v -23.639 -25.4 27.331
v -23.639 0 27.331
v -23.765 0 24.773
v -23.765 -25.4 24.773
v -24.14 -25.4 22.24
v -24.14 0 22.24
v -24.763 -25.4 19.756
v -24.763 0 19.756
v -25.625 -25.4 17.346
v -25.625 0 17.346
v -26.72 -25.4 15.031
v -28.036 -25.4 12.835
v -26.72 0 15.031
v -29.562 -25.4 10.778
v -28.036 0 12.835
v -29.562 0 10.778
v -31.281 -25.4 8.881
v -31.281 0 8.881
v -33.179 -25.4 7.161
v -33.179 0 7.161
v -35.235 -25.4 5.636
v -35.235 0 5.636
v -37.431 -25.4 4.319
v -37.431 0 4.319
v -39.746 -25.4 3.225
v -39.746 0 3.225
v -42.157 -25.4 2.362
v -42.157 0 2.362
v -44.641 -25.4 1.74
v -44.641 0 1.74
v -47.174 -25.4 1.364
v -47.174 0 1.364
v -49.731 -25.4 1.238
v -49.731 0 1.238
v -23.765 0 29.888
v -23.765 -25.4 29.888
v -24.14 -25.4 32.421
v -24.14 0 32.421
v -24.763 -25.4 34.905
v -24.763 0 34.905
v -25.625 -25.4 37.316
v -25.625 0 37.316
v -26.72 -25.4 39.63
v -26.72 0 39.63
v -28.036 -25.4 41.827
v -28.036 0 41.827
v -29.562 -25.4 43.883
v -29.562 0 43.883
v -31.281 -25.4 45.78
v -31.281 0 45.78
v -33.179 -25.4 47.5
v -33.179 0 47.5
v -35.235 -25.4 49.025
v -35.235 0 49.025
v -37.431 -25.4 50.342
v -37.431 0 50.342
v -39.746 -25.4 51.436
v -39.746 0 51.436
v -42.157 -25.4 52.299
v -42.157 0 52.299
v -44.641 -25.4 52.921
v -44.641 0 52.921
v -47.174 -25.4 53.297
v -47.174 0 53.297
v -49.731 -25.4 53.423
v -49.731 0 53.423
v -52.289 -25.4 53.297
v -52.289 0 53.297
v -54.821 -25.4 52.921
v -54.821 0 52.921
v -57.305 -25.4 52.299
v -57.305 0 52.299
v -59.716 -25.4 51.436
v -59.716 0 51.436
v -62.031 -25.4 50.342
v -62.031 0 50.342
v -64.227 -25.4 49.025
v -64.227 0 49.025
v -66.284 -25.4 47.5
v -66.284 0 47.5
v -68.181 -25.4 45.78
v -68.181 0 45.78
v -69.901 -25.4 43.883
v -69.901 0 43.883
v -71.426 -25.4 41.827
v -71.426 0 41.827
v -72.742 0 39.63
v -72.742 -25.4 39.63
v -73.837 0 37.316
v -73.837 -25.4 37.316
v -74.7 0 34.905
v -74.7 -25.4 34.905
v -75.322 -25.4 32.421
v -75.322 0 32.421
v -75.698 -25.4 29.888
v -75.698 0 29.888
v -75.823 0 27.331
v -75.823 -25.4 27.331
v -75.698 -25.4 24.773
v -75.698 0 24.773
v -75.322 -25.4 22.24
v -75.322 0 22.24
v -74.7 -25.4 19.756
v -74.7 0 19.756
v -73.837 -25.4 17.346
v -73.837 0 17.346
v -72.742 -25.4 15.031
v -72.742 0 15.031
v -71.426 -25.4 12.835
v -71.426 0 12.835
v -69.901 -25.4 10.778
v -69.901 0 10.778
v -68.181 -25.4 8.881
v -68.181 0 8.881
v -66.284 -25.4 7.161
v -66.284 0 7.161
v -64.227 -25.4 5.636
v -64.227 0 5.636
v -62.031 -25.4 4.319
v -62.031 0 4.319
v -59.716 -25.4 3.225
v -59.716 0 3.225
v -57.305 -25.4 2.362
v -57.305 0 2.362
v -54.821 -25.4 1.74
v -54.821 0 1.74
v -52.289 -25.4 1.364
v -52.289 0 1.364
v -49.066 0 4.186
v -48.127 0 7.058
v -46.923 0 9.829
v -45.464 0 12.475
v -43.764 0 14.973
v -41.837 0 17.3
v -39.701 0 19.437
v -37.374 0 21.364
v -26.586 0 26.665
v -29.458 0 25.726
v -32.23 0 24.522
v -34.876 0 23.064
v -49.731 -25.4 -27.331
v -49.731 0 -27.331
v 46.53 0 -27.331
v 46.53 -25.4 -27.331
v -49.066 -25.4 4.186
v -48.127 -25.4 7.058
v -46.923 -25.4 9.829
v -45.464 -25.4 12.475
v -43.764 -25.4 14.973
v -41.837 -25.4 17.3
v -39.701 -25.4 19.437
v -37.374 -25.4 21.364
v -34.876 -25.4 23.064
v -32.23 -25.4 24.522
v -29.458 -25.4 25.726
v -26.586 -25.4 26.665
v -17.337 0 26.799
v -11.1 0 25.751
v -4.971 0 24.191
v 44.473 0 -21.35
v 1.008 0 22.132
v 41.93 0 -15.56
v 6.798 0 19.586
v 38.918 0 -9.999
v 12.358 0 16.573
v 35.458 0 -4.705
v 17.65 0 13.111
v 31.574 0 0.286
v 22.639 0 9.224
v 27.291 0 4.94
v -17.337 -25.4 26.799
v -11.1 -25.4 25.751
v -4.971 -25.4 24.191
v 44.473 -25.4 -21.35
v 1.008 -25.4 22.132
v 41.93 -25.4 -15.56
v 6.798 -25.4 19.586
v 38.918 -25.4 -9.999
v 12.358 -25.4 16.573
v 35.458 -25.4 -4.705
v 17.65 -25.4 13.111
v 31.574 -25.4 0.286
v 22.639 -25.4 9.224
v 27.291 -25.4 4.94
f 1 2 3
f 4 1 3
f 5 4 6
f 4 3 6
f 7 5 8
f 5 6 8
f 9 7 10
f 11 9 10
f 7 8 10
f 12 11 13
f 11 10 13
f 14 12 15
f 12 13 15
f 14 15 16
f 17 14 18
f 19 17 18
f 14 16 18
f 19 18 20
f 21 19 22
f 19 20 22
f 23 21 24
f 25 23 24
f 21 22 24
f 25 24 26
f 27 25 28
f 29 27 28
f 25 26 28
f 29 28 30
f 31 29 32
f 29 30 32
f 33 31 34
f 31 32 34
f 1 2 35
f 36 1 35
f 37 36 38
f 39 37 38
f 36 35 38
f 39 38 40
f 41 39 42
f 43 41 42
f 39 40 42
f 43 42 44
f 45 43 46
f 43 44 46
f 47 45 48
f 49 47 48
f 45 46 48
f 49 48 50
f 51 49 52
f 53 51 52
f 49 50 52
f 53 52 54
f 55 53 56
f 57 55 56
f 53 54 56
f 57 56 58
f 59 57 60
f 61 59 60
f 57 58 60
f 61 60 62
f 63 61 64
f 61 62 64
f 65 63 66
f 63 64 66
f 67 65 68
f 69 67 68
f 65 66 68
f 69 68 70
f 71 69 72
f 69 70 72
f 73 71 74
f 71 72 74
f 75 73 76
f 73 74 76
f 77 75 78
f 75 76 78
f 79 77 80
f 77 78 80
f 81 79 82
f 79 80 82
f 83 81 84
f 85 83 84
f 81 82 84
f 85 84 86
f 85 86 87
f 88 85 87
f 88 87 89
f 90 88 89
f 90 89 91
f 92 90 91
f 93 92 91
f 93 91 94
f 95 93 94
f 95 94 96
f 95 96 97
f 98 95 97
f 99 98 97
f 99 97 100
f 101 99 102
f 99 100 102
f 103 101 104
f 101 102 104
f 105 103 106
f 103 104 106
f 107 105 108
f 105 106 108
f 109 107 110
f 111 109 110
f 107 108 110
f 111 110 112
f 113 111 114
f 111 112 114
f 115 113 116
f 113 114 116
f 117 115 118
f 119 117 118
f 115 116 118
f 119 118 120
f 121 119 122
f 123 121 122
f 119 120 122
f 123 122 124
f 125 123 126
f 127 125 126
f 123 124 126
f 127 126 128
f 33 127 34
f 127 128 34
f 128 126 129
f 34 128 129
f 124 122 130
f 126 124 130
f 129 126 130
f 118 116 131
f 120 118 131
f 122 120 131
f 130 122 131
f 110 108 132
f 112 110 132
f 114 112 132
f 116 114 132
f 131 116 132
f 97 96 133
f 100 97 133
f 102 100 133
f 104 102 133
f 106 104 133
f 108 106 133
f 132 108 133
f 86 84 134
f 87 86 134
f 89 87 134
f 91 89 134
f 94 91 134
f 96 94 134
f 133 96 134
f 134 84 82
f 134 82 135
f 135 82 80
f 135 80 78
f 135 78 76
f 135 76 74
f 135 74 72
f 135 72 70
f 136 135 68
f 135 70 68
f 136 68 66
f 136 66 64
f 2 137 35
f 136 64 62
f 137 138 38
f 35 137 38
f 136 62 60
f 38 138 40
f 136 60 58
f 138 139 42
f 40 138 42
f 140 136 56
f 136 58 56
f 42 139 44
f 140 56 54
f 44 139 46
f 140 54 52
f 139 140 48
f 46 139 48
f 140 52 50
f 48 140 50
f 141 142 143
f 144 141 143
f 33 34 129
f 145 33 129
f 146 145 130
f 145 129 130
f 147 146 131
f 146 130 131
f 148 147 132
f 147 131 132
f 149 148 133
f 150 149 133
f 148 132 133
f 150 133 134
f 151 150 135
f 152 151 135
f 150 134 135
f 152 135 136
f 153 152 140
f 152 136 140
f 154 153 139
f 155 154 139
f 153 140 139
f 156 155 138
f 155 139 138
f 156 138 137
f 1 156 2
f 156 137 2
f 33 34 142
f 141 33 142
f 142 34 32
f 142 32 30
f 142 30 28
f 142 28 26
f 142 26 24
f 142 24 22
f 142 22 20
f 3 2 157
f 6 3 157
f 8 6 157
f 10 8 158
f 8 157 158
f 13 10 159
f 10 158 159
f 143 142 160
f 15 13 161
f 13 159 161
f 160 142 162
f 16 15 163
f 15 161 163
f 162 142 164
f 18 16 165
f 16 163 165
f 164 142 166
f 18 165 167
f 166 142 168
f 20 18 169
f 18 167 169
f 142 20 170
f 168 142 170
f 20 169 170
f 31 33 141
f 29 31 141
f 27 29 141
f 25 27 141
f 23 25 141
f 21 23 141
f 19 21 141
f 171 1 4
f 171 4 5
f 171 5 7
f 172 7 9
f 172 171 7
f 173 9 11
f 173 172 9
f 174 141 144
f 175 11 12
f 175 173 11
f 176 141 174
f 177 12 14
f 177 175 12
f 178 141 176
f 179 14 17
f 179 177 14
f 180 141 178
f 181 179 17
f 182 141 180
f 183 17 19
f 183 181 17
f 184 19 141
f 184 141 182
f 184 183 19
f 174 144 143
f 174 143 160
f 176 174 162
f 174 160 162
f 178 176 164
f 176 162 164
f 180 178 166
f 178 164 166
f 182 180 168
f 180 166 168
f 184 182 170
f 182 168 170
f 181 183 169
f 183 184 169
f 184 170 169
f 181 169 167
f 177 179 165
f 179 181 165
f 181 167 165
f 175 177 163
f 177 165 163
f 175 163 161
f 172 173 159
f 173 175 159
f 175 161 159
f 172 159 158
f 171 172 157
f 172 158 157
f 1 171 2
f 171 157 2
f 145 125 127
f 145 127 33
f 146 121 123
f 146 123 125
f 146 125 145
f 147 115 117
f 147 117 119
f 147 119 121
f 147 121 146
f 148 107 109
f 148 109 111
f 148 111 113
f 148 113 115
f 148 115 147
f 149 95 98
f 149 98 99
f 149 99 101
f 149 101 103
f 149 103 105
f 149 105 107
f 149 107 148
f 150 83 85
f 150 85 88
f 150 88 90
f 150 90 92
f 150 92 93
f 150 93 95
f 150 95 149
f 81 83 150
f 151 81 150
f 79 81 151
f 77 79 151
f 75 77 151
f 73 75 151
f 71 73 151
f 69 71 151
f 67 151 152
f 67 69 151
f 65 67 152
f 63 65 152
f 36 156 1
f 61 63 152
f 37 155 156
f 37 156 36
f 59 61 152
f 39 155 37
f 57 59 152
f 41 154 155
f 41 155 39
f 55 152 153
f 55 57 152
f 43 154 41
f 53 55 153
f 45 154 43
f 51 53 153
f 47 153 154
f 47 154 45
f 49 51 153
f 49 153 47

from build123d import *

# Parameters (mm, degrees)
F1_DEPTH    = 25.4
F2_T1_DEPTH = 408.305123953
F3_T1_DEPTH = 25.4


# Not quite as in the source:
# - a fillet or chamfer that OpenCascade refuses, or shapes differently, is made with other operations: its cross-section is extruded or revolved along the edge and cut away or added


with BuildPart() as f1:
    # F0 (on Front) → F1 (new body)
    with BuildSketch(Plane.XZ):
        with BuildLine():
            ThreePointArc((-23.6390728491, 27.3305587471), (-68.1810033514, 45.7804304554), (-49.7311316431, 1.2384999531))
            Line((-49.7311316431, 1.2384999531), (-49.7311316431, 27.3305587471))
            Line((-49.7311316431, 27.3305587471), (-23.6390728491, 27.3305587471))
        make_face()
    extrude(amount=F1_DEPTH)

    # F3: fillet of radius 32.1935378542 on 1 edges, made by hand

    # F3_s2 → F3_t1 (join)
    with BuildSketch(Plane.XZ):
        with BuildLine():
            ThreePointArc((-49.7311316431, 1.2384999531), (-40.7942631124, 18.3936902164), (-23.6390728491, 27.3305587471))
            Line((-23.6390728491, 27.3305587471), (-49.7311316431, 27.3305587471))
            Line((-49.7311316431, 27.3305587471), (-49.7311316431, 1.2384999531))
        make_face()
    extrude(amount=F3_T1_DEPTH)


with BuildPart() as f1b:
    # F0 (on Front) → F1, piece 2 (new body)
    with BuildSketch(Plane.XZ):
        with BuildLine():
            Line((-49.7311316431, -27.3305587471), (49.7311316431, -27.3305587471))
            Line((49.7311316431, -27.3305587471), (49.7311316431, 27.3305587471))
            Line((49.7311316431, 27.3305587471), (-23.6390728491, 27.3305587471))
            ThreePointArc((-23.6390728491, 27.3305587471), (-31.2812599347, 8.8806870387), (-49.7311316431, 1.2384999531))
            Line((-49.7311316431, 1.2384999531), (-49.7311316431, -27.3305587471))
        make_face()
    extrude(amount=F1_DEPTH)

    # F2: fillet of radius 76.6512806053 on 1 edges, made by hand

    # F2_s2 → F2_t1 (cut)
    with BuildSketch(Plane.XZ.offset(-191.4525619765)):
        with BuildLine():
            ThreePointArc((49.7311316431, -49.2504660436), (28.4283718141, 3.7774517574), (-23.6390728491, 27.3305587471))
            Line((-23.6390728491, 27.3305587471), (49.7311316431, 27.3305587471))
            Line((49.7311316431, 27.3305587471), (49.7311316431, -49.2504660436))
        make_face()
    extrude(amount=F2_T1_DEPTH, mode=Mode.SUBTRACT)


solid = Compound([f1.part, f1b.part])
